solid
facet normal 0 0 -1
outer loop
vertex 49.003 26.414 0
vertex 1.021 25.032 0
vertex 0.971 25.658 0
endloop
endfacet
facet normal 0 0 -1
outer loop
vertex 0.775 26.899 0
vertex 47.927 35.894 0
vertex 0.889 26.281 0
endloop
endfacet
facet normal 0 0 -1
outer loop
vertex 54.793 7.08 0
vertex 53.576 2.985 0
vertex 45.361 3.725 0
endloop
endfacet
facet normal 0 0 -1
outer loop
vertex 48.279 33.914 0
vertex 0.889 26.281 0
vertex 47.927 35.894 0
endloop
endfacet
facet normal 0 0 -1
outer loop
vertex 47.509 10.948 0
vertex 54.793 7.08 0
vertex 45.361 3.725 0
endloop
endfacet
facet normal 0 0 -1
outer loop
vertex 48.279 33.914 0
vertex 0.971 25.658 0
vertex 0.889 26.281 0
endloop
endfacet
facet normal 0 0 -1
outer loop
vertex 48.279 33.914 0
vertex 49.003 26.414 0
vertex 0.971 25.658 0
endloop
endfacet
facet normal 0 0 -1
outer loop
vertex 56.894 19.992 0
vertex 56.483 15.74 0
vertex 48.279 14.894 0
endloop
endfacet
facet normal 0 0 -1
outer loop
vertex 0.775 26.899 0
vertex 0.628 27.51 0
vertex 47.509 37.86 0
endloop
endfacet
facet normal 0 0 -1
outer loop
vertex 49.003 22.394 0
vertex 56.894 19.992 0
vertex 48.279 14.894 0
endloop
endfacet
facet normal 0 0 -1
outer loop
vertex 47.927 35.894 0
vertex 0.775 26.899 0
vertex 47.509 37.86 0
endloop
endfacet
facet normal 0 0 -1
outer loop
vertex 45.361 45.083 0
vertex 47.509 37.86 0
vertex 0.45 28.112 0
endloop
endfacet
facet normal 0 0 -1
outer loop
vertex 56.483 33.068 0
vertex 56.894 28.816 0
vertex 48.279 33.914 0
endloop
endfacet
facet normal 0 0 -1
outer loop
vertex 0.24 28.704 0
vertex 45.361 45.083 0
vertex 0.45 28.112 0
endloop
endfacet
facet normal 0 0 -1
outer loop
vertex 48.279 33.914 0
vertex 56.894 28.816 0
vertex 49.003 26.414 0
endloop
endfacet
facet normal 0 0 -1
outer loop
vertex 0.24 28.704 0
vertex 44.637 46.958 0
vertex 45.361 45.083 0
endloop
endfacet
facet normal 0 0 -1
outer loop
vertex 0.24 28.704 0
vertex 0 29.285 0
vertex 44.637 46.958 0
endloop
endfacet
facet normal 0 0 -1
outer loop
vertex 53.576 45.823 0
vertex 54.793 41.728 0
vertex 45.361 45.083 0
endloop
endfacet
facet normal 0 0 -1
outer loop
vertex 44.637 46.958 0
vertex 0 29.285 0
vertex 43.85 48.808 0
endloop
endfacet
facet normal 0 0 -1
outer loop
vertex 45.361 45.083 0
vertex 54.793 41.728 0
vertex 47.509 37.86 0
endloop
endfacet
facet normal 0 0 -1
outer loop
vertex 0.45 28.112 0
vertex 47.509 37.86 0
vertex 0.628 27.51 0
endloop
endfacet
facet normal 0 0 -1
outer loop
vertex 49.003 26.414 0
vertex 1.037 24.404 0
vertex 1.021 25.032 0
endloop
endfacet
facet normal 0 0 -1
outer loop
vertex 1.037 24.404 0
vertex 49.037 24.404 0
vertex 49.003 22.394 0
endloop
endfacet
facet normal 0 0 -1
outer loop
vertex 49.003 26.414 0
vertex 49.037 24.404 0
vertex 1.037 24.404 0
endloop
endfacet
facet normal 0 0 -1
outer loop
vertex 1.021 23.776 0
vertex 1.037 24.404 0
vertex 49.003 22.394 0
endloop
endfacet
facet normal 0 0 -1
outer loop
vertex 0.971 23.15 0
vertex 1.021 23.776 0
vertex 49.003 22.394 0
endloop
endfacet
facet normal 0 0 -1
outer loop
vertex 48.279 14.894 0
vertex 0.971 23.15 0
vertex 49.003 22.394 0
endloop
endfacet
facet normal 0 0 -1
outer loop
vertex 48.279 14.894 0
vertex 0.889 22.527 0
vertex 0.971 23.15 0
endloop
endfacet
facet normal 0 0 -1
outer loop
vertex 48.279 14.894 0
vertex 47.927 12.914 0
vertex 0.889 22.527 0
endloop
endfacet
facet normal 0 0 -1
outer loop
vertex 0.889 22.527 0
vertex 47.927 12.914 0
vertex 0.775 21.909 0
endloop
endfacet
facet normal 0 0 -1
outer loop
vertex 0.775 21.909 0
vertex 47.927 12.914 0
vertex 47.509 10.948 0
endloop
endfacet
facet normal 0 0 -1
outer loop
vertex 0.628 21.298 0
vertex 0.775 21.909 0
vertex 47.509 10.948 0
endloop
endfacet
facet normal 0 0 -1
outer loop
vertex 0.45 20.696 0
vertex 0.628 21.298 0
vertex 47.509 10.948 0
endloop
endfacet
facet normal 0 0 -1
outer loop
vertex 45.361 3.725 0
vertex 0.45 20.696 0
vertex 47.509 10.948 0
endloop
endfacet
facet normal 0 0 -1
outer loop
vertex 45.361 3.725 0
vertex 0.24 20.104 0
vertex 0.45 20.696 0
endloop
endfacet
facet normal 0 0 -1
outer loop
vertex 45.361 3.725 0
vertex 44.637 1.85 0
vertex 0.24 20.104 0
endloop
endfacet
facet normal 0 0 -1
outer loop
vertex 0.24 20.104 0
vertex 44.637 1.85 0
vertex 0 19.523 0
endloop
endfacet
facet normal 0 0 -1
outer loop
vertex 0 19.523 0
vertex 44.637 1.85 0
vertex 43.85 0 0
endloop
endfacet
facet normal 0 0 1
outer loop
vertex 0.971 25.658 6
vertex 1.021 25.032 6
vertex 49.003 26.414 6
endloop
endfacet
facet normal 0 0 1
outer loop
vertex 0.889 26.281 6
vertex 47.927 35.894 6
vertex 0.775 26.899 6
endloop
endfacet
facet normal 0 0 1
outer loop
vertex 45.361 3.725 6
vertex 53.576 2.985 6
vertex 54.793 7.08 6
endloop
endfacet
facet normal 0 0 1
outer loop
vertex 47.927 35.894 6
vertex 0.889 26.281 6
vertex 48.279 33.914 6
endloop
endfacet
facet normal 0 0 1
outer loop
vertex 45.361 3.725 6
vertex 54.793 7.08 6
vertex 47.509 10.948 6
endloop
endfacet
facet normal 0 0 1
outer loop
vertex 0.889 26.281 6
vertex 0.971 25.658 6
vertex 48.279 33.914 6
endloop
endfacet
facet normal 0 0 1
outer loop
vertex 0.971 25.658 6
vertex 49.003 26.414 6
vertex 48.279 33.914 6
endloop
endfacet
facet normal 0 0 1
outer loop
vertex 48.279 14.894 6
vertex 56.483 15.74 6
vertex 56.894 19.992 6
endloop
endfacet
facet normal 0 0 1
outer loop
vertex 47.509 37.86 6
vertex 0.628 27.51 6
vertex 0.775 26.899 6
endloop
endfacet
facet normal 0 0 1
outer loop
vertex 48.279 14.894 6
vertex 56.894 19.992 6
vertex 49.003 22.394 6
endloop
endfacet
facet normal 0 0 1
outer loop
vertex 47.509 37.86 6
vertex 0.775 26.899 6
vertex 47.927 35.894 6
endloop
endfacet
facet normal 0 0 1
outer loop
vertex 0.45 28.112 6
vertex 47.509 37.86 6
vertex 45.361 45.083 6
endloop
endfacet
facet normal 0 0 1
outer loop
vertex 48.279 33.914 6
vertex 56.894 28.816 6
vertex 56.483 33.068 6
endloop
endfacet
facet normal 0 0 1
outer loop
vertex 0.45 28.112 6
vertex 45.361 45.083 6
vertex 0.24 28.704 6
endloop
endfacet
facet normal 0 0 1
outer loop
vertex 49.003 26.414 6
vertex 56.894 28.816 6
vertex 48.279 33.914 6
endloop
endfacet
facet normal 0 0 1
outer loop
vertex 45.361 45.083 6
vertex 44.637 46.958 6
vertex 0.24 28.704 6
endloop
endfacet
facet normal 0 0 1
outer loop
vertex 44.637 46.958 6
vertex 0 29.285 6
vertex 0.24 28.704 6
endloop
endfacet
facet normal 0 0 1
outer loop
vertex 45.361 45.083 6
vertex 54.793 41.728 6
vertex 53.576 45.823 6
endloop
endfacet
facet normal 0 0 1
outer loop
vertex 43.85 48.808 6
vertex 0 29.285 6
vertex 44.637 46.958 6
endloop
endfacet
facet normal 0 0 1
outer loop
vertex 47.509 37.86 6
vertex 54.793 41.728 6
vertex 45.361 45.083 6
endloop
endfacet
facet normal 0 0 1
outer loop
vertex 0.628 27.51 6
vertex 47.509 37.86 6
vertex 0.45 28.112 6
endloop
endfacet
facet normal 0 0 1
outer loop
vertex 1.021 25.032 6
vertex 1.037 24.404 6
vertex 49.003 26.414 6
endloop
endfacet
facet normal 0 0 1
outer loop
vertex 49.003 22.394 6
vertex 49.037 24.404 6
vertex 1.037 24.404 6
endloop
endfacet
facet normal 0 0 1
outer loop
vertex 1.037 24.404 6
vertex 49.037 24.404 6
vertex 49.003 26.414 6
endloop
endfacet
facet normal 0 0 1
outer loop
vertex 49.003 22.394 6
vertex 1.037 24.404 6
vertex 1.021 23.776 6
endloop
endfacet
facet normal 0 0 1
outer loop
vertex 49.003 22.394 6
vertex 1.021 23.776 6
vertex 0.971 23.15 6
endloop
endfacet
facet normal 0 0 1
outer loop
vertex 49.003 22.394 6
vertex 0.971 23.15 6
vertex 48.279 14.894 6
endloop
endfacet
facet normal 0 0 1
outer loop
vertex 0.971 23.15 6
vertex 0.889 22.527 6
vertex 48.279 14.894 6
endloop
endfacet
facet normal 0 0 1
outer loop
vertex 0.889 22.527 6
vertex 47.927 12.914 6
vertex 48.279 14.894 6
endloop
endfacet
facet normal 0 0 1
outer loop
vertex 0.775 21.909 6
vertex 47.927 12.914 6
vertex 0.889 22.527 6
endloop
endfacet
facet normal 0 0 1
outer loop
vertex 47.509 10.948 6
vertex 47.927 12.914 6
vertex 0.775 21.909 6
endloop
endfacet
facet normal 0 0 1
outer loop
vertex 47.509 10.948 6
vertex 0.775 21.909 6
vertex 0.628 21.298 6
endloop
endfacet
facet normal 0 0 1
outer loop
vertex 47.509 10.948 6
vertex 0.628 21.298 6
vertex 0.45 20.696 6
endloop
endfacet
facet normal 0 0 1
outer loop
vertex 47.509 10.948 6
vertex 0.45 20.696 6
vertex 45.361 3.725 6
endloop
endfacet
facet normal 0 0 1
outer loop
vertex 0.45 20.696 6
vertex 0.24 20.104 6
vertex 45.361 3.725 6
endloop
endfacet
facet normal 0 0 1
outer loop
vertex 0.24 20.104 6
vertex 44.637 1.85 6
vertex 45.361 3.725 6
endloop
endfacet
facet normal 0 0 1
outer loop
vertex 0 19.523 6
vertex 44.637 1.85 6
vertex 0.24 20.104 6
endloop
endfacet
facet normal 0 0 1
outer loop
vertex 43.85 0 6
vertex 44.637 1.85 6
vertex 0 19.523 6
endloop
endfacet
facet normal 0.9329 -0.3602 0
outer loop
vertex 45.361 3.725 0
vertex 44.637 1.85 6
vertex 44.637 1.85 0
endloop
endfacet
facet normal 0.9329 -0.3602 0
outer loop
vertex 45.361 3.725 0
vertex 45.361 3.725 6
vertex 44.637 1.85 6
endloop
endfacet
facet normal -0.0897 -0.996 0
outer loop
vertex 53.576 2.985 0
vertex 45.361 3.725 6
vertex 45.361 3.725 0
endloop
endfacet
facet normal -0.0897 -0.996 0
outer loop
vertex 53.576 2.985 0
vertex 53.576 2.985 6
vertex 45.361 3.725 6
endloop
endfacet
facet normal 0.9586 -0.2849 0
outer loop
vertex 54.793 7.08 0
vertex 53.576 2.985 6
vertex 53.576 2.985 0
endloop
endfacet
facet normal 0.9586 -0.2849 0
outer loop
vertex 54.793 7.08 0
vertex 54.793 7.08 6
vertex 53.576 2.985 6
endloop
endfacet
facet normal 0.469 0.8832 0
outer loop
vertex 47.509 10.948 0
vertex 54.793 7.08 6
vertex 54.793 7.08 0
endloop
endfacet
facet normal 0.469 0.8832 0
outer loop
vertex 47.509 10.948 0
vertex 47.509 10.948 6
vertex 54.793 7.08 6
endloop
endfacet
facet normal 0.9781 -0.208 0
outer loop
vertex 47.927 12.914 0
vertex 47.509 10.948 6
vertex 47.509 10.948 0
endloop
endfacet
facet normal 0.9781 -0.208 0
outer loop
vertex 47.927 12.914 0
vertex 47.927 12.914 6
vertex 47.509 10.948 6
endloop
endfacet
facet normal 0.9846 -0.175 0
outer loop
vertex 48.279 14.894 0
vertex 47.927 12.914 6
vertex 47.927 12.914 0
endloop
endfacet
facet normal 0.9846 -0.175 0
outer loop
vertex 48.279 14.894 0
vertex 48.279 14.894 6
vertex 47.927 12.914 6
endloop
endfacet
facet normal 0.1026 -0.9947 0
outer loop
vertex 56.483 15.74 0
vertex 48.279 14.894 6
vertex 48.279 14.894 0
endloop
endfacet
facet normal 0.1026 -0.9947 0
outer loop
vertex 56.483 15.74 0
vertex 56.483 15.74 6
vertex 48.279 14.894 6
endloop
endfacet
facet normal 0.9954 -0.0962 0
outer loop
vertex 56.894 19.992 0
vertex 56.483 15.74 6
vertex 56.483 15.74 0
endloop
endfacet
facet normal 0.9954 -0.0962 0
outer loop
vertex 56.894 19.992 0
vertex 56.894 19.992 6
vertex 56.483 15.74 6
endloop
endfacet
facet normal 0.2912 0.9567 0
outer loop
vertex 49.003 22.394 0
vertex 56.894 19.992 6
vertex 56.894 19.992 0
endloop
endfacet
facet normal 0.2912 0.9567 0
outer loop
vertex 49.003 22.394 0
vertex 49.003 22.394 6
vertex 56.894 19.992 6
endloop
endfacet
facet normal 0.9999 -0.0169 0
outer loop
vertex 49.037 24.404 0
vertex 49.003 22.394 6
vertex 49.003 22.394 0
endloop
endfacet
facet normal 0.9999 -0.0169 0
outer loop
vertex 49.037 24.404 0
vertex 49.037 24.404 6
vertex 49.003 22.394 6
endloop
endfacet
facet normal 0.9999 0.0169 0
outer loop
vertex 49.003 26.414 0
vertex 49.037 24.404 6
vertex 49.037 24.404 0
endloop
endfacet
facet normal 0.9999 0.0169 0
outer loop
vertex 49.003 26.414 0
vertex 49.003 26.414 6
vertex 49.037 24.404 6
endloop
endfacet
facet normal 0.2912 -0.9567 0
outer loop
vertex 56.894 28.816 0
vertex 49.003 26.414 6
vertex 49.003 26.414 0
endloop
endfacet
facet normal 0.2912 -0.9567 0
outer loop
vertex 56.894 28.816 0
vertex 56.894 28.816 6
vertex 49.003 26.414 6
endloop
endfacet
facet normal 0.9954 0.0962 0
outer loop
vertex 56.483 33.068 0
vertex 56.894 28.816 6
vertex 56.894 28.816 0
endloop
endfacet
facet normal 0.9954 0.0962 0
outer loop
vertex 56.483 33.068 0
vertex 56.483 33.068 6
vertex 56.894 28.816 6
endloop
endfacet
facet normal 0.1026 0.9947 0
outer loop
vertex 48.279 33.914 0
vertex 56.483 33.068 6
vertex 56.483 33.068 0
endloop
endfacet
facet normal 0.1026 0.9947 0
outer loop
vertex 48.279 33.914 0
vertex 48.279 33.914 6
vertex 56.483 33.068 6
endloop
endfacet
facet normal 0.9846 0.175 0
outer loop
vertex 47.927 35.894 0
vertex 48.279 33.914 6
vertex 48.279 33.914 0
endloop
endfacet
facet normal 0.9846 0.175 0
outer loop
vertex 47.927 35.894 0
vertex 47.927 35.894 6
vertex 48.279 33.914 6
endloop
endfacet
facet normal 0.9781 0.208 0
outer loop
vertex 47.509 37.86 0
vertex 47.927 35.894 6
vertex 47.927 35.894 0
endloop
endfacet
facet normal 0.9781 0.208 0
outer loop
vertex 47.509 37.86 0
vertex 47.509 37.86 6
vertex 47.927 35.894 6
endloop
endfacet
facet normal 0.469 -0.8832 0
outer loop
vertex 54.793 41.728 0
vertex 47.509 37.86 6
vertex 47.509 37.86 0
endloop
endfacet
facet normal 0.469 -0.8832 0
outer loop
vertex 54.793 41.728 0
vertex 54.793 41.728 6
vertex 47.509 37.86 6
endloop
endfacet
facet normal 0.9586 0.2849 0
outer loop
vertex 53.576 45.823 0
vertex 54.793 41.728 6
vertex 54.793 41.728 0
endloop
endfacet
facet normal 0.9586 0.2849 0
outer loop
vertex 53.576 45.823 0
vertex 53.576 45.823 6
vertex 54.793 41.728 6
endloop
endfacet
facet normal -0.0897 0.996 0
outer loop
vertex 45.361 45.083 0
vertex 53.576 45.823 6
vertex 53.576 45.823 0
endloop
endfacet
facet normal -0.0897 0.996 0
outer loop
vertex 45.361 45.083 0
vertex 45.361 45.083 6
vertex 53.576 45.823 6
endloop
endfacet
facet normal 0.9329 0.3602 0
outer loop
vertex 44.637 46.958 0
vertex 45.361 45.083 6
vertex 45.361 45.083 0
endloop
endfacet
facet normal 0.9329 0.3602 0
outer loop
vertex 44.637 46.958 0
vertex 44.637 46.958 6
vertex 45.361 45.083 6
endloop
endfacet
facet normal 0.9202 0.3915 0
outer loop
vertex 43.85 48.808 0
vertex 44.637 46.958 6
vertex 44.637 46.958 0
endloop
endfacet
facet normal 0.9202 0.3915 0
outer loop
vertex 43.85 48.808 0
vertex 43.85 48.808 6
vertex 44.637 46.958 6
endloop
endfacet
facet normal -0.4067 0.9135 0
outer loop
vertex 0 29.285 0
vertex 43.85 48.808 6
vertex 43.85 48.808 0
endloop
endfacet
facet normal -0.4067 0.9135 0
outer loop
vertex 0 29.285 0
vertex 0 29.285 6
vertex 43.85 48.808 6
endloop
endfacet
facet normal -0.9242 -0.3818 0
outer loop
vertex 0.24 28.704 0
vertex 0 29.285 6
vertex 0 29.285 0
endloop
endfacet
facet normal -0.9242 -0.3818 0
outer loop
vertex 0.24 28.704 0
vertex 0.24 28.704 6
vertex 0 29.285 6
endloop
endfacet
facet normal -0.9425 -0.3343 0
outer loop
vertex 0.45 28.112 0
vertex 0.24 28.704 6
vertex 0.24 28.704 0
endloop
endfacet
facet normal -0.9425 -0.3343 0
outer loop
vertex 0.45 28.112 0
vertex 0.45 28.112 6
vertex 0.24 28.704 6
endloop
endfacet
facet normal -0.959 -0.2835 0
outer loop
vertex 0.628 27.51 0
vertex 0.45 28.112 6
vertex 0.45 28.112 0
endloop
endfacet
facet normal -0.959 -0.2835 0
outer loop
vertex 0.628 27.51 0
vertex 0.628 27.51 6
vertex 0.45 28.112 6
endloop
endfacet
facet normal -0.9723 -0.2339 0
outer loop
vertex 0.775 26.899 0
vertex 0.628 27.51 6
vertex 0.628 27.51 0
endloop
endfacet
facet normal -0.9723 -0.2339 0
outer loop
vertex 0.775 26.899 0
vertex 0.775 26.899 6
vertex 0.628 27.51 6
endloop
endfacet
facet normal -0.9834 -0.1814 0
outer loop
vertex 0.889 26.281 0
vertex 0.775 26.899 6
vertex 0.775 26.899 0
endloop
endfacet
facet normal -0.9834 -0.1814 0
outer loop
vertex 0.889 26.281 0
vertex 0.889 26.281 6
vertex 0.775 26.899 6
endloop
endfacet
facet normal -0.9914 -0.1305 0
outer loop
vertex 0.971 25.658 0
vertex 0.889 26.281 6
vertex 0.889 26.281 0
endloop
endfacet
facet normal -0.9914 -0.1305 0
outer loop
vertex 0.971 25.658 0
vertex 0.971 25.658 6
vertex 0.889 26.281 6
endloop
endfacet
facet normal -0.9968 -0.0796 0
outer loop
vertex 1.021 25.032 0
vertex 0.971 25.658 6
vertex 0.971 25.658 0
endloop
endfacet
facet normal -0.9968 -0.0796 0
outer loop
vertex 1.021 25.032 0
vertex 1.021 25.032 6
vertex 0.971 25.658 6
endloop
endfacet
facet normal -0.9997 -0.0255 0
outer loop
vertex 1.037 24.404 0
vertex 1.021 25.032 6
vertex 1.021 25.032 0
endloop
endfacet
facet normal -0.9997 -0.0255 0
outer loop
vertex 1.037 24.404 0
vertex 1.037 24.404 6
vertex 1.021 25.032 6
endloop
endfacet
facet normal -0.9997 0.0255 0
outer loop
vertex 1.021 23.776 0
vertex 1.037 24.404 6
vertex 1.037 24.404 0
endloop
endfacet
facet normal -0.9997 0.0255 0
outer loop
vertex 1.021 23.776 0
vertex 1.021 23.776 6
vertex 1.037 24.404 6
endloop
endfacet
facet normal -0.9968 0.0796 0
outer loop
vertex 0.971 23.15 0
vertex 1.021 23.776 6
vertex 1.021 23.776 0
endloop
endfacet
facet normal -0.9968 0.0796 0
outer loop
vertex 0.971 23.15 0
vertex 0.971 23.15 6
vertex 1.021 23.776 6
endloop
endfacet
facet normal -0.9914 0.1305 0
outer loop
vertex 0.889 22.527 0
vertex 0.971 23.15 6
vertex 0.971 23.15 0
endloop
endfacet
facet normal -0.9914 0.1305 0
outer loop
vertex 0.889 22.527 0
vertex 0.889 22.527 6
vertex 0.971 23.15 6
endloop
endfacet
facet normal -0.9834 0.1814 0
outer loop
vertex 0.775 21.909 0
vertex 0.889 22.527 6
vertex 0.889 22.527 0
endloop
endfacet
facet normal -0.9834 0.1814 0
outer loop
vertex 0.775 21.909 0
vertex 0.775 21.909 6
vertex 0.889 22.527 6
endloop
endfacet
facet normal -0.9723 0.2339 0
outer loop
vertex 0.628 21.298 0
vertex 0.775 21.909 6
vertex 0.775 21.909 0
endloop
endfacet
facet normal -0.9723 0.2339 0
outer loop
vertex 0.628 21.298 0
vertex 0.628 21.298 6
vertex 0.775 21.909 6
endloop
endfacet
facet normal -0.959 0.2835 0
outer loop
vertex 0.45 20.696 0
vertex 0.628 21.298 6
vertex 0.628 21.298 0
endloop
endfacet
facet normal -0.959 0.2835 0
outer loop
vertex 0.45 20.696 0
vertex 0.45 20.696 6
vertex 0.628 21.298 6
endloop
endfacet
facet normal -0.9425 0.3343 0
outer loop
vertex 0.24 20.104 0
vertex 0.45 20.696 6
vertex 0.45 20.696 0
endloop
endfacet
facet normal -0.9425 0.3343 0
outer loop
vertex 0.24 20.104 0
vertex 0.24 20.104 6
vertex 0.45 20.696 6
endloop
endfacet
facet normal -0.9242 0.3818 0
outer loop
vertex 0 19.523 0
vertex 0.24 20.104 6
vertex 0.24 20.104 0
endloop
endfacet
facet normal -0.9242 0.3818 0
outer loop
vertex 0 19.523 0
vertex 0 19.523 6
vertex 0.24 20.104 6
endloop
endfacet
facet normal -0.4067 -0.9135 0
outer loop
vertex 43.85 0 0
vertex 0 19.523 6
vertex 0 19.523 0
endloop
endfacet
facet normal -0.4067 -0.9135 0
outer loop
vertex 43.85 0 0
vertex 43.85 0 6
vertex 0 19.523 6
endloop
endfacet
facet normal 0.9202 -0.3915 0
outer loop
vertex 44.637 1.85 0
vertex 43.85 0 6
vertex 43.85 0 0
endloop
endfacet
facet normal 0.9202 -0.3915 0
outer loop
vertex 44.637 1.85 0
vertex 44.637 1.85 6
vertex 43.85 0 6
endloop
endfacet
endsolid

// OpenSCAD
$fn = 32;

// ----------------------------------------------------------------------
// Gear sector: 4 teeth on 48 degrees
// ----------------------------------------------------------------------

// --- parameters (mm) ---
sector_angle = 48;        // sector angle, degrees
root_r = 60;              // root circle radius
tooth_h = 8;              // tooth height over the root circle
teeth = 4;                // number of teeth on the sector
hub_r = 12;               // hub bore radius
plate_t = 6;              // sector thickness, Z
arc_step = 3;             // sampling step of the root/hub arcs, degrees

tip_r = root_r + tooth_h;  // tip circle radius

profile = [[43.85, 0], [44.637, 1.85], [45.361, 3.725], [53.576, 2.985], [54.793, 7.08], [47.509, 10.948], [47.927, 12.914], [48.279, 14.894], [56.483, 15.74], [56.894, 19.992], [49.003, 22.394], [49.037, 24.404], [49.003, 26.414], [56.894, 28.816], [56.483, 33.068], [48.279, 33.914], [47.927, 35.894], [47.509, 37.86], [54.793, 41.728], [53.576, 45.823], [45.361, 45.083], [44.637, 46.958], [43.85, 48.808], [0, 29.285], [0.24, 28.704], [0.45, 28.112], [0.628, 27.51], [0.775, 26.899], [0.889, 26.281], [0.971, 25.658], [1.021, 25.032], [1.037, 24.404], [1.021, 23.776], [0.971, 23.15], [0.889, 22.527], [0.775, 21.909], [0.628, 21.298], [0.45, 20.696], [0.24, 20.104], [0, 19.523]];  // primary outline, 40 points, counter clockwise

// --- the one profile operation ---
linear_extrude(height = plate_t) polygon(points = profile);
